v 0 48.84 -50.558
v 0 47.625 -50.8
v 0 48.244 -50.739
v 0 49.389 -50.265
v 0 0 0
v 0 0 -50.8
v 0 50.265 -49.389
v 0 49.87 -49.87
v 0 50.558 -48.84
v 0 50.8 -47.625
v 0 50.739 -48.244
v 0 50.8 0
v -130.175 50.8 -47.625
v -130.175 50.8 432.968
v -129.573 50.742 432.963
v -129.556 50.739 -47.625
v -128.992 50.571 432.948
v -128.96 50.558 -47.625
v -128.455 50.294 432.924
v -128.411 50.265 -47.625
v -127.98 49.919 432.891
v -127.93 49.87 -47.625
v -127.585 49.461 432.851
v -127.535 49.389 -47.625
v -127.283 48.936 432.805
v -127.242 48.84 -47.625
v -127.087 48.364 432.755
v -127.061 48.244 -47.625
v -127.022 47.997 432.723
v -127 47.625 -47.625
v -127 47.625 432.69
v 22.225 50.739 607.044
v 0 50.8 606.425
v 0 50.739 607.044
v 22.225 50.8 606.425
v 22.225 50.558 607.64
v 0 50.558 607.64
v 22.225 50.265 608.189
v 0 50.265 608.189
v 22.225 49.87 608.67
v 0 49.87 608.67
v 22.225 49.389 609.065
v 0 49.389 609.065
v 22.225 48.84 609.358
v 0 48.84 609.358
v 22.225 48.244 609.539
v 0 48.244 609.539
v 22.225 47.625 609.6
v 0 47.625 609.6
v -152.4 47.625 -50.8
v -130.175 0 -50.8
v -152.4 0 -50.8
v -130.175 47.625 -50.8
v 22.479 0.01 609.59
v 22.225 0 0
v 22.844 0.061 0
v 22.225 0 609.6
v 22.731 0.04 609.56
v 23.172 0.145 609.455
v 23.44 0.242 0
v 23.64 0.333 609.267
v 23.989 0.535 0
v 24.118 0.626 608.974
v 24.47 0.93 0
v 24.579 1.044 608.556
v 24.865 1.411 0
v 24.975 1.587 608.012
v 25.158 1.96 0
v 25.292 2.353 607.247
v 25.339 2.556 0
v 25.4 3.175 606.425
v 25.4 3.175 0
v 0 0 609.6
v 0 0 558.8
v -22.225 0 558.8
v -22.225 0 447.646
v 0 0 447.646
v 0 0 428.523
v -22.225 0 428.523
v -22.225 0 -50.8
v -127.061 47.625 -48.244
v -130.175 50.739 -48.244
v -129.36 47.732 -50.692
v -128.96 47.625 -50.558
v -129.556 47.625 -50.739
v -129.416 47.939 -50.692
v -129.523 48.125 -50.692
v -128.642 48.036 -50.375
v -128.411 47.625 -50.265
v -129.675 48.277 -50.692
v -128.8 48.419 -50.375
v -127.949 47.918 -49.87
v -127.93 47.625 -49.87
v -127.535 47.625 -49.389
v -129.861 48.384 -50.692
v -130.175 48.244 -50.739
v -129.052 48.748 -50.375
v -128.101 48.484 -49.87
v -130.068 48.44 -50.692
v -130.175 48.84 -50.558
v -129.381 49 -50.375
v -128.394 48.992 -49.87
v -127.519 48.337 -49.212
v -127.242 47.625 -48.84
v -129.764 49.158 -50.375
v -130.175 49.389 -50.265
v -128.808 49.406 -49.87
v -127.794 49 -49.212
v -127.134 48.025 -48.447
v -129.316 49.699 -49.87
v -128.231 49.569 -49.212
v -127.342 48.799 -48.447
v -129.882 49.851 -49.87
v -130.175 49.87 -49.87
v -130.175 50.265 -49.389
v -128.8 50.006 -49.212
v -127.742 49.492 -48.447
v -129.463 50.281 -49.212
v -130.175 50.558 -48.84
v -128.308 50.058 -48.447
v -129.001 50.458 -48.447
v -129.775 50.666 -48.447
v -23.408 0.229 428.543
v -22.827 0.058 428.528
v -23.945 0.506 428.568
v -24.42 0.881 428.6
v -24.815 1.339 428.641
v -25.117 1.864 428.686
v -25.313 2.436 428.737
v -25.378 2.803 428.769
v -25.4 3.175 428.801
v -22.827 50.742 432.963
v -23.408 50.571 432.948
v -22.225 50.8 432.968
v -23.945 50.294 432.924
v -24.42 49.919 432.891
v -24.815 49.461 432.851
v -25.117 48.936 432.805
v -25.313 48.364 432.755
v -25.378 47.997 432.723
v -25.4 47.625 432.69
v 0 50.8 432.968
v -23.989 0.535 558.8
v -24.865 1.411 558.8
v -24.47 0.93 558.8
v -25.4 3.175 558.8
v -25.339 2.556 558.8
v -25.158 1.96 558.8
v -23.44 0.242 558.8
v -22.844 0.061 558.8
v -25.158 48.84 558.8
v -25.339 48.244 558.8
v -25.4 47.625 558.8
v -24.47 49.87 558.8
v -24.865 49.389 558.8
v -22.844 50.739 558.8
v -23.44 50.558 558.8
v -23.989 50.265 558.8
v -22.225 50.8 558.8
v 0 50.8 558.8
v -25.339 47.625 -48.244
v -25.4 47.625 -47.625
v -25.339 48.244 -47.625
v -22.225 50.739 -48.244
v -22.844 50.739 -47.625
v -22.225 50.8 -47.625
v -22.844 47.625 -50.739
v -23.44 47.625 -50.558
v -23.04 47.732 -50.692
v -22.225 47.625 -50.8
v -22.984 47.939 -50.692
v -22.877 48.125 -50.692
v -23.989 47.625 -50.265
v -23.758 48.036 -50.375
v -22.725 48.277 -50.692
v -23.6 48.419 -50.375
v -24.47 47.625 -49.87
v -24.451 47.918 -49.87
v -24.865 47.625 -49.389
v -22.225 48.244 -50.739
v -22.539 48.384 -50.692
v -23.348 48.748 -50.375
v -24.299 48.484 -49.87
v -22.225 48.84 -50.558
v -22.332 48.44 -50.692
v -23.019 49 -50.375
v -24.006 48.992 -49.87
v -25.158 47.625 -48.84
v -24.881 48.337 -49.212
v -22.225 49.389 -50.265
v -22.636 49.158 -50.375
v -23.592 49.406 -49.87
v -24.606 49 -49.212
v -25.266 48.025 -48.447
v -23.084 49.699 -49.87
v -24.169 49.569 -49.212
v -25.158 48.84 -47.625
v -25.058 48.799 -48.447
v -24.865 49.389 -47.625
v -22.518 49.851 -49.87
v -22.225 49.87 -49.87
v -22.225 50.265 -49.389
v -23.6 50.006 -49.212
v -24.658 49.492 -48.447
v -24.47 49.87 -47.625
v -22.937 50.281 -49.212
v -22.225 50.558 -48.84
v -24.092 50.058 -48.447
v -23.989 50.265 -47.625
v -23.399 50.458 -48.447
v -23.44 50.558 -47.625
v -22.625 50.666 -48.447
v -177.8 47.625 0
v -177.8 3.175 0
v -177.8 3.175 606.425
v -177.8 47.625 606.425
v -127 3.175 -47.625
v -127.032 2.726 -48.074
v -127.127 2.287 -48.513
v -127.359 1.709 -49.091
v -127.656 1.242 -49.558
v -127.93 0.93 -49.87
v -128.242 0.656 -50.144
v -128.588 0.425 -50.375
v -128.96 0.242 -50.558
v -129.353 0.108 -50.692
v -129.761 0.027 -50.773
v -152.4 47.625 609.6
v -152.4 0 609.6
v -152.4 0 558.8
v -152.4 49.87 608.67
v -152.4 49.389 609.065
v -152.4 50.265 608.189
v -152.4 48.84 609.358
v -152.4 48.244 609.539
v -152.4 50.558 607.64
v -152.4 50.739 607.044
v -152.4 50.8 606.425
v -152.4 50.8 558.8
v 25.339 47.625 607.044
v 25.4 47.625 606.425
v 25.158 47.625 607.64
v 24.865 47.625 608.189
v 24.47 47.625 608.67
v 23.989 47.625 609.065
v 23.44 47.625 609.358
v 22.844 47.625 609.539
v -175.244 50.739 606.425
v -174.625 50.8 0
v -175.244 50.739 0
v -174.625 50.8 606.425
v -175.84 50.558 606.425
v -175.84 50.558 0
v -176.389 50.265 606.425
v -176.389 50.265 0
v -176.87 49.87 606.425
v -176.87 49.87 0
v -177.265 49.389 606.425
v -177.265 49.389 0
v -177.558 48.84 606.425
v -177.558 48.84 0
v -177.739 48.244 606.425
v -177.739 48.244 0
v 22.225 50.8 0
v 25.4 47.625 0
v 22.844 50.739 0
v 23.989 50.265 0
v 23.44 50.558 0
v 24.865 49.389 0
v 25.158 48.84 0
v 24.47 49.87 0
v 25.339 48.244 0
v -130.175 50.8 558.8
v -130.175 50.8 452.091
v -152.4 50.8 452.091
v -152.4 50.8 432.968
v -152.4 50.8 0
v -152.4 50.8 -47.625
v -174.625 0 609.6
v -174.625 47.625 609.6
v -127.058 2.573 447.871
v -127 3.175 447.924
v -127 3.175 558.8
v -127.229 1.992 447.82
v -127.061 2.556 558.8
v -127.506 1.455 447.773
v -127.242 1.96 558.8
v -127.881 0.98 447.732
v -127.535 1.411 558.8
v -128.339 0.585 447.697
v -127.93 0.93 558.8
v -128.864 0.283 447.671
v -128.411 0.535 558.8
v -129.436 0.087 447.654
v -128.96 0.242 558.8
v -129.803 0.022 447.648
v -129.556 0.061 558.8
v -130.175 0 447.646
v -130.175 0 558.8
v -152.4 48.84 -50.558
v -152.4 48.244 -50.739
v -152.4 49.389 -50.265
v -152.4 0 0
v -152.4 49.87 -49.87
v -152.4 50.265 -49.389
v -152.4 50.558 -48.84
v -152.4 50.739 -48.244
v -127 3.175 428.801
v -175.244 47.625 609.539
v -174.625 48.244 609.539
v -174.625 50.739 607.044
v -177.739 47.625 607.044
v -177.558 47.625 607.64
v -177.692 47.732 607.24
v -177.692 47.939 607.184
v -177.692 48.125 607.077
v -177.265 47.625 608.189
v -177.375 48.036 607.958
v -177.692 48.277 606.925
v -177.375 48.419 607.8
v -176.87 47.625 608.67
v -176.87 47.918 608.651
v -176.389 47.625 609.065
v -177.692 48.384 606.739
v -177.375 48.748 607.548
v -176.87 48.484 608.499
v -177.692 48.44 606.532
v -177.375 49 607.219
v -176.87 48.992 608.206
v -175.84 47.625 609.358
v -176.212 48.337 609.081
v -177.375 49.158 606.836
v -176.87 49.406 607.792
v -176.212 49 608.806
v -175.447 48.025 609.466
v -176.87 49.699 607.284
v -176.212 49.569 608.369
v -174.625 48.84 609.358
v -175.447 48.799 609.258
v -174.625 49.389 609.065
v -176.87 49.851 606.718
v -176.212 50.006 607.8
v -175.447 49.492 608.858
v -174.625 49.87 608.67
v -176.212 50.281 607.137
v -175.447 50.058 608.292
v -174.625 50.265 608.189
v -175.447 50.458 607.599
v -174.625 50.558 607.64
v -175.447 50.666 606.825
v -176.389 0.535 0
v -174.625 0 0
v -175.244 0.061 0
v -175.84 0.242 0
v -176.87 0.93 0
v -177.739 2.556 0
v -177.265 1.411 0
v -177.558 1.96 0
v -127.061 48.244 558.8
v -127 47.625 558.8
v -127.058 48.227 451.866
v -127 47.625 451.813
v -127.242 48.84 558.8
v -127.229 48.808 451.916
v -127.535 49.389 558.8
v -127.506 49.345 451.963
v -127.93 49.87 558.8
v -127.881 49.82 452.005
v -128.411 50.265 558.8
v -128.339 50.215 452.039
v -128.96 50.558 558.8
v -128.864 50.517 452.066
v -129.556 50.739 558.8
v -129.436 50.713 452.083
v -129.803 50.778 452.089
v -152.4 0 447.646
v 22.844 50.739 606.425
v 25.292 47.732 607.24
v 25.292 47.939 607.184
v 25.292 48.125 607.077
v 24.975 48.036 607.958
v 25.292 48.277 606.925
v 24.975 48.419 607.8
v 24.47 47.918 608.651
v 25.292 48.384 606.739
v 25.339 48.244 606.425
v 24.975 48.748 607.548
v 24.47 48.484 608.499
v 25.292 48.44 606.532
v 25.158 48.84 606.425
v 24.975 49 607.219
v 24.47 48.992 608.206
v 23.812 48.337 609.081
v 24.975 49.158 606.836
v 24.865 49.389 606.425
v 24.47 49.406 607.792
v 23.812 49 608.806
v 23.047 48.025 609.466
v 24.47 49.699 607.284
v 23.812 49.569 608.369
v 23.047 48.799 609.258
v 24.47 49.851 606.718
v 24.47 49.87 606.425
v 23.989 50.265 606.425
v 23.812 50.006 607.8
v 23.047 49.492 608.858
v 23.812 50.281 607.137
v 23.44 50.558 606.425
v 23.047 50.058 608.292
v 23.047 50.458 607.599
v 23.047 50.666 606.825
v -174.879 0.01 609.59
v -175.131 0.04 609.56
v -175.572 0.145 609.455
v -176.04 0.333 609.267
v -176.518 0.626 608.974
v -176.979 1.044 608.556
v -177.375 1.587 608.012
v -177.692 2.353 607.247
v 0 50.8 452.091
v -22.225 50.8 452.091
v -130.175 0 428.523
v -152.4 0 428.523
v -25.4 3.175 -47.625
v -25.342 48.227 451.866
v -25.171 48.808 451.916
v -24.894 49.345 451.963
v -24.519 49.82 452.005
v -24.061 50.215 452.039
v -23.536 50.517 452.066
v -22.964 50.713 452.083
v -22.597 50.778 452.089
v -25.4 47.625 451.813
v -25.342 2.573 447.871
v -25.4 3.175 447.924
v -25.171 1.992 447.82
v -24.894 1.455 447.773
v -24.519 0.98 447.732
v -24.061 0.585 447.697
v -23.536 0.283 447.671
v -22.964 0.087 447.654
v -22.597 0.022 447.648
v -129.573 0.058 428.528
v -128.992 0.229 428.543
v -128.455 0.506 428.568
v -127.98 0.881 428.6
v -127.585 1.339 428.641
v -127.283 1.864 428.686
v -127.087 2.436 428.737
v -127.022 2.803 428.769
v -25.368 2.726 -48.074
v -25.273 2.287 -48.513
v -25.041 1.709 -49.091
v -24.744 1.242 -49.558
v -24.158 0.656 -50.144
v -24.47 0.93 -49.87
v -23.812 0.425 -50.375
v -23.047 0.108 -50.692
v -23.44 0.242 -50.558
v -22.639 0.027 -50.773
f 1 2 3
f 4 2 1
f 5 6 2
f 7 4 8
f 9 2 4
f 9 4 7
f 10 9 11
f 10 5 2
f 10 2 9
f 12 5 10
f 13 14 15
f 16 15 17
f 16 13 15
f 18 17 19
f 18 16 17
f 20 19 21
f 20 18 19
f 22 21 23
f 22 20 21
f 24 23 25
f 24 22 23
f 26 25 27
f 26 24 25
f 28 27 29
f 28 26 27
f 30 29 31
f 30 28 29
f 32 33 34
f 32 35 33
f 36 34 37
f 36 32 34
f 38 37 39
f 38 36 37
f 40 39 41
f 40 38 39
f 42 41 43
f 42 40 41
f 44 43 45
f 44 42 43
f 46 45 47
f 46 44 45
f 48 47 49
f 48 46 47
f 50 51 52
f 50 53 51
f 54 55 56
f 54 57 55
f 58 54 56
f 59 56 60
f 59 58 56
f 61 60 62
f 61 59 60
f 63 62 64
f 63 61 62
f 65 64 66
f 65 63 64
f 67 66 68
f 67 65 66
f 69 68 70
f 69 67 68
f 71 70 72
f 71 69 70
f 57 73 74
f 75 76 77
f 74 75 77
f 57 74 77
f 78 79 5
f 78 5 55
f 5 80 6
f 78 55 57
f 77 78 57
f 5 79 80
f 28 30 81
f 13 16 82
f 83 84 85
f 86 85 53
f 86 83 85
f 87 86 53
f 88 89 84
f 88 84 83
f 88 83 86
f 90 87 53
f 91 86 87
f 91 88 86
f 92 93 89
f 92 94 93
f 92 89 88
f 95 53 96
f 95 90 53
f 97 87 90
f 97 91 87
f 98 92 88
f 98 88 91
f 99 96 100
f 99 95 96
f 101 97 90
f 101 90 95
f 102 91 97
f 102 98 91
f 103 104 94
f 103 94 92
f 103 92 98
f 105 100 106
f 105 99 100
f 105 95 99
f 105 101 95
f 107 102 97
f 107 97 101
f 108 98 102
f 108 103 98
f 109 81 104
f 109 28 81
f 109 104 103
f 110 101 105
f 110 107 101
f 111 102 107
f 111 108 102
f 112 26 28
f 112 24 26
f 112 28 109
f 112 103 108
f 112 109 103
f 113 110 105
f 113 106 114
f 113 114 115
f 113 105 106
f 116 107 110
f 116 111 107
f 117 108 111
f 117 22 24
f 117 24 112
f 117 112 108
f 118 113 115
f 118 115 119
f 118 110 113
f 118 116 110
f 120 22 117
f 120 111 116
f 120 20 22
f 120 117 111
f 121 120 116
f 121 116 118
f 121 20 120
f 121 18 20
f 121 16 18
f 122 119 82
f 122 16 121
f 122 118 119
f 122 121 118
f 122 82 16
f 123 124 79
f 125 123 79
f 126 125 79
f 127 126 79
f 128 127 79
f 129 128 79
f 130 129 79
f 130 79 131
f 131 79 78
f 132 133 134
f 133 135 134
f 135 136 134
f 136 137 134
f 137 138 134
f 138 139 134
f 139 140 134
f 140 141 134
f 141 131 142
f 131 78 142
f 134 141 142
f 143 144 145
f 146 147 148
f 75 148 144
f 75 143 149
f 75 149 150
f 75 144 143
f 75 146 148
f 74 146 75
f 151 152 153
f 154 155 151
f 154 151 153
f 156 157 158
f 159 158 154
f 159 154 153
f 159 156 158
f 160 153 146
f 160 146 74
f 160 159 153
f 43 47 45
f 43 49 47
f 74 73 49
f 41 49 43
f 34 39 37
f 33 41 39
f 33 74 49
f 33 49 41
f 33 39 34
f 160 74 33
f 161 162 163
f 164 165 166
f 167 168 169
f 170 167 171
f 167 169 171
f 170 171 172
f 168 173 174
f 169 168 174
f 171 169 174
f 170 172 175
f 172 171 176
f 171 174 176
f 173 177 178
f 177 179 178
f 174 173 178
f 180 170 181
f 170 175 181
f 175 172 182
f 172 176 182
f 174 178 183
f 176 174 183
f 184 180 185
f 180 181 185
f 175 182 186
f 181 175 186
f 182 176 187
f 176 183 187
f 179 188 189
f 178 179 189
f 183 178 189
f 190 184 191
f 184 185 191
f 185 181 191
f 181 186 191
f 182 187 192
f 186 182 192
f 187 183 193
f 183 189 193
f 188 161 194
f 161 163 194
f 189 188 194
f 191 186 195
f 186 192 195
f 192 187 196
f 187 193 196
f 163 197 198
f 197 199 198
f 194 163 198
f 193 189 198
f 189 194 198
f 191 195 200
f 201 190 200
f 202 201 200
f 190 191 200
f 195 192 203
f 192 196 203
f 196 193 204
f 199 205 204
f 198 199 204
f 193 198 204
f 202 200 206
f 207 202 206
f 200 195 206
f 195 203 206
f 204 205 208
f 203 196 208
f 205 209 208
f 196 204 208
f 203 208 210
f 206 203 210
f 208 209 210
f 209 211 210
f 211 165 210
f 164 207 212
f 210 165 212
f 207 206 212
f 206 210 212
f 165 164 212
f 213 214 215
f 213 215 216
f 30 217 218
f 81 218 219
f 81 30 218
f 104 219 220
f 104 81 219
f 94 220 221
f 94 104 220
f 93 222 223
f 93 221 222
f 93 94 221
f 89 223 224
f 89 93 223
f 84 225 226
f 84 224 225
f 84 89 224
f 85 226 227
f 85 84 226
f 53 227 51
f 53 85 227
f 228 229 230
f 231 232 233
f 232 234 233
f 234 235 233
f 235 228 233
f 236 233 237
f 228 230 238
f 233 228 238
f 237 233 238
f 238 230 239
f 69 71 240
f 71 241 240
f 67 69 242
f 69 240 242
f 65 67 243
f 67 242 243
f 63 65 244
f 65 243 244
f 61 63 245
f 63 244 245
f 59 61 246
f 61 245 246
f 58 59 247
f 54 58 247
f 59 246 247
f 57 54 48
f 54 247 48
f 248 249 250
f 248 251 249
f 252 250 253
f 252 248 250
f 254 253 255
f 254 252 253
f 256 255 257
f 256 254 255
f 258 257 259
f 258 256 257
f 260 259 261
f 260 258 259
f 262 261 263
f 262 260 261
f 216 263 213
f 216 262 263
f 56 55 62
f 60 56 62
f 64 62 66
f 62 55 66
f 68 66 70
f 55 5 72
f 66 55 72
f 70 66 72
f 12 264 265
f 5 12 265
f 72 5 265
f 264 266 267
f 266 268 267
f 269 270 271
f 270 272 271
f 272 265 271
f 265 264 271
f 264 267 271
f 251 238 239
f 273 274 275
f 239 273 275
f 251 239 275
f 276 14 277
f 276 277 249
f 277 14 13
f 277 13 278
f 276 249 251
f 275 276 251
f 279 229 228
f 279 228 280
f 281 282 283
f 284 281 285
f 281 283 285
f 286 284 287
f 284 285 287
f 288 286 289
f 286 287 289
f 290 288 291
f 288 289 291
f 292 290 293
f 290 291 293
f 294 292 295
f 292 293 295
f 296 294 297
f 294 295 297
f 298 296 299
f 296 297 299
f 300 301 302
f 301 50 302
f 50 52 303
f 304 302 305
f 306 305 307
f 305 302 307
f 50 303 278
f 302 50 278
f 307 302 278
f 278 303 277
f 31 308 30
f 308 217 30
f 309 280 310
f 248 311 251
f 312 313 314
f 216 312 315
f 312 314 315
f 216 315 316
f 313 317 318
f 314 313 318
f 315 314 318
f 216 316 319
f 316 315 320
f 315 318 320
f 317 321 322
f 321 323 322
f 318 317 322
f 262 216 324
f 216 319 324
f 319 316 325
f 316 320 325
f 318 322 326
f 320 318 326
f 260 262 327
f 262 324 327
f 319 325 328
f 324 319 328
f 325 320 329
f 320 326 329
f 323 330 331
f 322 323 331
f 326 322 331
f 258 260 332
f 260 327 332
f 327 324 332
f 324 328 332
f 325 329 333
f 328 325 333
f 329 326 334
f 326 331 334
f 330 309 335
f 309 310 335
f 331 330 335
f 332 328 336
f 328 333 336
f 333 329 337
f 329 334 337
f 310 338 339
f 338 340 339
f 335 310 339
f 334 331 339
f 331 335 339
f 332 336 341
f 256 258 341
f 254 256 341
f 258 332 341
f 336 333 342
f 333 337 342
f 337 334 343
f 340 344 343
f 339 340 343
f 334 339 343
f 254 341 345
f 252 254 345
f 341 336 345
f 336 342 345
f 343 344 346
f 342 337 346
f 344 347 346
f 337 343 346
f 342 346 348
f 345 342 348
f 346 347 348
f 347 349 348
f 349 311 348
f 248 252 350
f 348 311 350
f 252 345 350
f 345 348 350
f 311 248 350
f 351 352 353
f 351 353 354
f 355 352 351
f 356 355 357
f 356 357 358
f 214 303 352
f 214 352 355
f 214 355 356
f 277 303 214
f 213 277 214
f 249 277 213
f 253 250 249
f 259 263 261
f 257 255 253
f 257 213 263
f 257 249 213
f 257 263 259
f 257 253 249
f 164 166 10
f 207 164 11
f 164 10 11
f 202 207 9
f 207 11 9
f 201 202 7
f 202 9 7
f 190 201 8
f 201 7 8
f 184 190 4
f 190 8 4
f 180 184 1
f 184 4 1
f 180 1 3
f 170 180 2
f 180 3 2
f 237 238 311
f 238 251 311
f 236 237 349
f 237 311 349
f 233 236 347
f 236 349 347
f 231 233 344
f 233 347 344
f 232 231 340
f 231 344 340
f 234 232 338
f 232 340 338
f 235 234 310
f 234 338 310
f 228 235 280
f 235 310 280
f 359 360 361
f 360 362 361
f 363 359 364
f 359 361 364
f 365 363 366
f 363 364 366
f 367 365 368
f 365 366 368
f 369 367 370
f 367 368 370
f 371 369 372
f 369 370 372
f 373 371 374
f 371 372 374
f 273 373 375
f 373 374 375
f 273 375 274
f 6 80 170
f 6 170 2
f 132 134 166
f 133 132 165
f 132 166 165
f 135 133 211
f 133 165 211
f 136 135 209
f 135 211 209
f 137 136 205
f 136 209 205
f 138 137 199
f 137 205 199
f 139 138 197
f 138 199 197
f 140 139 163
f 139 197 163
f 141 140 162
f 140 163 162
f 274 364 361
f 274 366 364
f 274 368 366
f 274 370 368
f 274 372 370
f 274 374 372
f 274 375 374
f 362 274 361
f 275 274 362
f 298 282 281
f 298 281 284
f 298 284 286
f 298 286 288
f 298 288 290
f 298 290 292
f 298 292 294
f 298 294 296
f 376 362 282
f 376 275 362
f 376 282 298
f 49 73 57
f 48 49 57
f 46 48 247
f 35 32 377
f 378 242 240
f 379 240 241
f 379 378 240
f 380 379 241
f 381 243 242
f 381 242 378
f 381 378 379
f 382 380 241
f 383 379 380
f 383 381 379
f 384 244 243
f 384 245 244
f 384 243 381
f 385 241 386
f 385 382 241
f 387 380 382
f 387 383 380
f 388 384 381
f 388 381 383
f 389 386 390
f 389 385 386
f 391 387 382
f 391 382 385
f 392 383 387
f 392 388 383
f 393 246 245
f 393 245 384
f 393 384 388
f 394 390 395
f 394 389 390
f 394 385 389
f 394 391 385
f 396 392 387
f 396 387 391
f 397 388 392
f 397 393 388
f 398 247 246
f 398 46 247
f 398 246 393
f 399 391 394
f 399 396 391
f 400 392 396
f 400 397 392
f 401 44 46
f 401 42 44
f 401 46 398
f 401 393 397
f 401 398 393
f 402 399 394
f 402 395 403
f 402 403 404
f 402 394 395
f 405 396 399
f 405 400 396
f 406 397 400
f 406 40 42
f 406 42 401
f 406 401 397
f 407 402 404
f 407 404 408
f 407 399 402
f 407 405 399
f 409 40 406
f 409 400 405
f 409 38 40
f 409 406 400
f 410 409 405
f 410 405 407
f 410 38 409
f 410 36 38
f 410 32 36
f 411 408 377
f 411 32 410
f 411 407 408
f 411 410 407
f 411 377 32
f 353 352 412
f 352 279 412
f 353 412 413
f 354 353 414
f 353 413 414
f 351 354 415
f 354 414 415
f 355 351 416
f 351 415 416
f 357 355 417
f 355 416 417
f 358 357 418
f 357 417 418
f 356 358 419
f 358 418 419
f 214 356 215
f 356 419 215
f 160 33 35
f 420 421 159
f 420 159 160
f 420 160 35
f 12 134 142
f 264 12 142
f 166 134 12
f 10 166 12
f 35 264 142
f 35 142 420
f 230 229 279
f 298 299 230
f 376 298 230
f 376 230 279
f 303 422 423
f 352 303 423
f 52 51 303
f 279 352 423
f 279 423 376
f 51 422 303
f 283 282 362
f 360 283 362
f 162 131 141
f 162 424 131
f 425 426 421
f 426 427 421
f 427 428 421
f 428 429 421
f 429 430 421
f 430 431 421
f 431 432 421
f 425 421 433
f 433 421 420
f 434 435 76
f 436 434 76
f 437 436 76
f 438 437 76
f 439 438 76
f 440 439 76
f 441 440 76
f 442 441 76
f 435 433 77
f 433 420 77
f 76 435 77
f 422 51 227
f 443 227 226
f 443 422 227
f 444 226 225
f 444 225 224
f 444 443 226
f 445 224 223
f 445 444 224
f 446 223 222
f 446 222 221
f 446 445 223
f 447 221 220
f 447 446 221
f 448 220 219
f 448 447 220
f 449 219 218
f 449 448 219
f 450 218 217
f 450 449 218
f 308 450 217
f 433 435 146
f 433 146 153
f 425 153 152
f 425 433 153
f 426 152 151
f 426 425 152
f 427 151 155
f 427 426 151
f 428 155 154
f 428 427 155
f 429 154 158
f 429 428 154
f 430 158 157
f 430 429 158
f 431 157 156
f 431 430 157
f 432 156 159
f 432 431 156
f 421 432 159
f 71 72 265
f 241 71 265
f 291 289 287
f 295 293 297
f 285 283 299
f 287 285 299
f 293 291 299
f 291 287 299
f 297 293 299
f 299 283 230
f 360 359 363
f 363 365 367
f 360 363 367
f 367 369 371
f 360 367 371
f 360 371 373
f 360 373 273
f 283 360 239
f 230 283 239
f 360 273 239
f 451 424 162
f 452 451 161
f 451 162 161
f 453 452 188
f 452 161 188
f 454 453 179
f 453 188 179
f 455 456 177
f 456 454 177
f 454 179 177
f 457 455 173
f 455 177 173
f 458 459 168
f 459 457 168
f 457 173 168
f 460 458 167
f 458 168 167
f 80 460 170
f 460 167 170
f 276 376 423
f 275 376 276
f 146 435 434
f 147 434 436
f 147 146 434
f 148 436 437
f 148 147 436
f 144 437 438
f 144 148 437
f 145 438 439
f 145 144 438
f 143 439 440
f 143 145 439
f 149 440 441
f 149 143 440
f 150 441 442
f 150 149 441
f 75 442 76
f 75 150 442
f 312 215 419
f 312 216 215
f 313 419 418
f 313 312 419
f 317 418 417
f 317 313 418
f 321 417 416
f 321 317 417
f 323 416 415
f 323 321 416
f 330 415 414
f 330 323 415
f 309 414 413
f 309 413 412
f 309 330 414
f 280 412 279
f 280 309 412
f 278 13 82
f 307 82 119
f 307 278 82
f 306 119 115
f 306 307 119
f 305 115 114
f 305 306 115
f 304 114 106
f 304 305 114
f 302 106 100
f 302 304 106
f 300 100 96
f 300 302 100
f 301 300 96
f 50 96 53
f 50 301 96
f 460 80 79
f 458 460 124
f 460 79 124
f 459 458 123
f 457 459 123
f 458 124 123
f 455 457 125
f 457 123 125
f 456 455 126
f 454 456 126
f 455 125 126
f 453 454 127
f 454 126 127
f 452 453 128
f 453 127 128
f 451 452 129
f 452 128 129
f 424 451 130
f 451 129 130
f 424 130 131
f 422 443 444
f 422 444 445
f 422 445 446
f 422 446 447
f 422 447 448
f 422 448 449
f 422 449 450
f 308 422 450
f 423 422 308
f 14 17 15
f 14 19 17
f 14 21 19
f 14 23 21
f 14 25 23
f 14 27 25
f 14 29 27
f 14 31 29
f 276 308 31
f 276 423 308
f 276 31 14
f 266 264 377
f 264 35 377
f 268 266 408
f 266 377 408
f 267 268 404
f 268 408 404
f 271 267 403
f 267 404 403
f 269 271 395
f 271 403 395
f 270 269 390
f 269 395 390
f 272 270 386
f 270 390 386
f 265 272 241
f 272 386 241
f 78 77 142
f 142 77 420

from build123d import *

# Parameters (mm, degrees)
F0_W          = 25.4
F0_H          = 50.8
F1_DEPTH      = 609.6
F2_DEPTH      = 50.8
F2_DEPTH_BACK = 558.8
F4_DEPTH      = 25.4
F5_R          = 3.175


with BuildPart() as f1:
    # F0 (on Top) → F1 (new body)
    with BuildSketch(Plane.XY):
        with Locations((12.7, 25.4)):
            Rectangle(F0_W, F0_H)
    extrude(amount=F1_DEPTH)

    # F0 (on Top) → F2 (join, two sides)
    with BuildSketch(Plane.XY) as f2_sk:
        with Locations((-12.7, 25.4)):
            Rectangle(F0_W, F0_H)
    extrude(amount=-F2_DEPTH)
    extrude(f2_sk.sketch, amount=F2_DEPTH_BACK)

    # F3 (on Right) → F4 (cut)
    with BuildSketch(Plane.YZ):
        Polygon((0, 428.5234), (50.8, 432.9678241071), (50.8, 452.0905920123), (0, 447.6461679052), align=None)
    extrude(amount=-F4_DEPTH, mode=Mode.SUBTRACT)

    # F5
    f5_edges = [f1.edges().sort_by_distance(p)[0] for p in [
        (-25.4, 50.8, 505.445296),
        (-25.4, 0, 503.223084),
        (-25.4, 50.8, 191.083912),
        (-25.4, 0, 188.8617),
        (12.7, 50.8, 609.6),
        (25.4, 25.4, 609.6),
        (25.4, 50.8, 304.8),
        (25.4, 0, 304.8),
        (-25.4, 25.4, -50.8),
        (-12.7, 50.8, -50.8),
    ]]
    fillet(f5_edges, radius=F5_R)


with BuildPart() as f7_1:
    # F7: instance of F1
    add(f1.part.mirror(Plane.YZ.offset(-76.2)))


solid = Compound([f1.part, f7_1.part])
